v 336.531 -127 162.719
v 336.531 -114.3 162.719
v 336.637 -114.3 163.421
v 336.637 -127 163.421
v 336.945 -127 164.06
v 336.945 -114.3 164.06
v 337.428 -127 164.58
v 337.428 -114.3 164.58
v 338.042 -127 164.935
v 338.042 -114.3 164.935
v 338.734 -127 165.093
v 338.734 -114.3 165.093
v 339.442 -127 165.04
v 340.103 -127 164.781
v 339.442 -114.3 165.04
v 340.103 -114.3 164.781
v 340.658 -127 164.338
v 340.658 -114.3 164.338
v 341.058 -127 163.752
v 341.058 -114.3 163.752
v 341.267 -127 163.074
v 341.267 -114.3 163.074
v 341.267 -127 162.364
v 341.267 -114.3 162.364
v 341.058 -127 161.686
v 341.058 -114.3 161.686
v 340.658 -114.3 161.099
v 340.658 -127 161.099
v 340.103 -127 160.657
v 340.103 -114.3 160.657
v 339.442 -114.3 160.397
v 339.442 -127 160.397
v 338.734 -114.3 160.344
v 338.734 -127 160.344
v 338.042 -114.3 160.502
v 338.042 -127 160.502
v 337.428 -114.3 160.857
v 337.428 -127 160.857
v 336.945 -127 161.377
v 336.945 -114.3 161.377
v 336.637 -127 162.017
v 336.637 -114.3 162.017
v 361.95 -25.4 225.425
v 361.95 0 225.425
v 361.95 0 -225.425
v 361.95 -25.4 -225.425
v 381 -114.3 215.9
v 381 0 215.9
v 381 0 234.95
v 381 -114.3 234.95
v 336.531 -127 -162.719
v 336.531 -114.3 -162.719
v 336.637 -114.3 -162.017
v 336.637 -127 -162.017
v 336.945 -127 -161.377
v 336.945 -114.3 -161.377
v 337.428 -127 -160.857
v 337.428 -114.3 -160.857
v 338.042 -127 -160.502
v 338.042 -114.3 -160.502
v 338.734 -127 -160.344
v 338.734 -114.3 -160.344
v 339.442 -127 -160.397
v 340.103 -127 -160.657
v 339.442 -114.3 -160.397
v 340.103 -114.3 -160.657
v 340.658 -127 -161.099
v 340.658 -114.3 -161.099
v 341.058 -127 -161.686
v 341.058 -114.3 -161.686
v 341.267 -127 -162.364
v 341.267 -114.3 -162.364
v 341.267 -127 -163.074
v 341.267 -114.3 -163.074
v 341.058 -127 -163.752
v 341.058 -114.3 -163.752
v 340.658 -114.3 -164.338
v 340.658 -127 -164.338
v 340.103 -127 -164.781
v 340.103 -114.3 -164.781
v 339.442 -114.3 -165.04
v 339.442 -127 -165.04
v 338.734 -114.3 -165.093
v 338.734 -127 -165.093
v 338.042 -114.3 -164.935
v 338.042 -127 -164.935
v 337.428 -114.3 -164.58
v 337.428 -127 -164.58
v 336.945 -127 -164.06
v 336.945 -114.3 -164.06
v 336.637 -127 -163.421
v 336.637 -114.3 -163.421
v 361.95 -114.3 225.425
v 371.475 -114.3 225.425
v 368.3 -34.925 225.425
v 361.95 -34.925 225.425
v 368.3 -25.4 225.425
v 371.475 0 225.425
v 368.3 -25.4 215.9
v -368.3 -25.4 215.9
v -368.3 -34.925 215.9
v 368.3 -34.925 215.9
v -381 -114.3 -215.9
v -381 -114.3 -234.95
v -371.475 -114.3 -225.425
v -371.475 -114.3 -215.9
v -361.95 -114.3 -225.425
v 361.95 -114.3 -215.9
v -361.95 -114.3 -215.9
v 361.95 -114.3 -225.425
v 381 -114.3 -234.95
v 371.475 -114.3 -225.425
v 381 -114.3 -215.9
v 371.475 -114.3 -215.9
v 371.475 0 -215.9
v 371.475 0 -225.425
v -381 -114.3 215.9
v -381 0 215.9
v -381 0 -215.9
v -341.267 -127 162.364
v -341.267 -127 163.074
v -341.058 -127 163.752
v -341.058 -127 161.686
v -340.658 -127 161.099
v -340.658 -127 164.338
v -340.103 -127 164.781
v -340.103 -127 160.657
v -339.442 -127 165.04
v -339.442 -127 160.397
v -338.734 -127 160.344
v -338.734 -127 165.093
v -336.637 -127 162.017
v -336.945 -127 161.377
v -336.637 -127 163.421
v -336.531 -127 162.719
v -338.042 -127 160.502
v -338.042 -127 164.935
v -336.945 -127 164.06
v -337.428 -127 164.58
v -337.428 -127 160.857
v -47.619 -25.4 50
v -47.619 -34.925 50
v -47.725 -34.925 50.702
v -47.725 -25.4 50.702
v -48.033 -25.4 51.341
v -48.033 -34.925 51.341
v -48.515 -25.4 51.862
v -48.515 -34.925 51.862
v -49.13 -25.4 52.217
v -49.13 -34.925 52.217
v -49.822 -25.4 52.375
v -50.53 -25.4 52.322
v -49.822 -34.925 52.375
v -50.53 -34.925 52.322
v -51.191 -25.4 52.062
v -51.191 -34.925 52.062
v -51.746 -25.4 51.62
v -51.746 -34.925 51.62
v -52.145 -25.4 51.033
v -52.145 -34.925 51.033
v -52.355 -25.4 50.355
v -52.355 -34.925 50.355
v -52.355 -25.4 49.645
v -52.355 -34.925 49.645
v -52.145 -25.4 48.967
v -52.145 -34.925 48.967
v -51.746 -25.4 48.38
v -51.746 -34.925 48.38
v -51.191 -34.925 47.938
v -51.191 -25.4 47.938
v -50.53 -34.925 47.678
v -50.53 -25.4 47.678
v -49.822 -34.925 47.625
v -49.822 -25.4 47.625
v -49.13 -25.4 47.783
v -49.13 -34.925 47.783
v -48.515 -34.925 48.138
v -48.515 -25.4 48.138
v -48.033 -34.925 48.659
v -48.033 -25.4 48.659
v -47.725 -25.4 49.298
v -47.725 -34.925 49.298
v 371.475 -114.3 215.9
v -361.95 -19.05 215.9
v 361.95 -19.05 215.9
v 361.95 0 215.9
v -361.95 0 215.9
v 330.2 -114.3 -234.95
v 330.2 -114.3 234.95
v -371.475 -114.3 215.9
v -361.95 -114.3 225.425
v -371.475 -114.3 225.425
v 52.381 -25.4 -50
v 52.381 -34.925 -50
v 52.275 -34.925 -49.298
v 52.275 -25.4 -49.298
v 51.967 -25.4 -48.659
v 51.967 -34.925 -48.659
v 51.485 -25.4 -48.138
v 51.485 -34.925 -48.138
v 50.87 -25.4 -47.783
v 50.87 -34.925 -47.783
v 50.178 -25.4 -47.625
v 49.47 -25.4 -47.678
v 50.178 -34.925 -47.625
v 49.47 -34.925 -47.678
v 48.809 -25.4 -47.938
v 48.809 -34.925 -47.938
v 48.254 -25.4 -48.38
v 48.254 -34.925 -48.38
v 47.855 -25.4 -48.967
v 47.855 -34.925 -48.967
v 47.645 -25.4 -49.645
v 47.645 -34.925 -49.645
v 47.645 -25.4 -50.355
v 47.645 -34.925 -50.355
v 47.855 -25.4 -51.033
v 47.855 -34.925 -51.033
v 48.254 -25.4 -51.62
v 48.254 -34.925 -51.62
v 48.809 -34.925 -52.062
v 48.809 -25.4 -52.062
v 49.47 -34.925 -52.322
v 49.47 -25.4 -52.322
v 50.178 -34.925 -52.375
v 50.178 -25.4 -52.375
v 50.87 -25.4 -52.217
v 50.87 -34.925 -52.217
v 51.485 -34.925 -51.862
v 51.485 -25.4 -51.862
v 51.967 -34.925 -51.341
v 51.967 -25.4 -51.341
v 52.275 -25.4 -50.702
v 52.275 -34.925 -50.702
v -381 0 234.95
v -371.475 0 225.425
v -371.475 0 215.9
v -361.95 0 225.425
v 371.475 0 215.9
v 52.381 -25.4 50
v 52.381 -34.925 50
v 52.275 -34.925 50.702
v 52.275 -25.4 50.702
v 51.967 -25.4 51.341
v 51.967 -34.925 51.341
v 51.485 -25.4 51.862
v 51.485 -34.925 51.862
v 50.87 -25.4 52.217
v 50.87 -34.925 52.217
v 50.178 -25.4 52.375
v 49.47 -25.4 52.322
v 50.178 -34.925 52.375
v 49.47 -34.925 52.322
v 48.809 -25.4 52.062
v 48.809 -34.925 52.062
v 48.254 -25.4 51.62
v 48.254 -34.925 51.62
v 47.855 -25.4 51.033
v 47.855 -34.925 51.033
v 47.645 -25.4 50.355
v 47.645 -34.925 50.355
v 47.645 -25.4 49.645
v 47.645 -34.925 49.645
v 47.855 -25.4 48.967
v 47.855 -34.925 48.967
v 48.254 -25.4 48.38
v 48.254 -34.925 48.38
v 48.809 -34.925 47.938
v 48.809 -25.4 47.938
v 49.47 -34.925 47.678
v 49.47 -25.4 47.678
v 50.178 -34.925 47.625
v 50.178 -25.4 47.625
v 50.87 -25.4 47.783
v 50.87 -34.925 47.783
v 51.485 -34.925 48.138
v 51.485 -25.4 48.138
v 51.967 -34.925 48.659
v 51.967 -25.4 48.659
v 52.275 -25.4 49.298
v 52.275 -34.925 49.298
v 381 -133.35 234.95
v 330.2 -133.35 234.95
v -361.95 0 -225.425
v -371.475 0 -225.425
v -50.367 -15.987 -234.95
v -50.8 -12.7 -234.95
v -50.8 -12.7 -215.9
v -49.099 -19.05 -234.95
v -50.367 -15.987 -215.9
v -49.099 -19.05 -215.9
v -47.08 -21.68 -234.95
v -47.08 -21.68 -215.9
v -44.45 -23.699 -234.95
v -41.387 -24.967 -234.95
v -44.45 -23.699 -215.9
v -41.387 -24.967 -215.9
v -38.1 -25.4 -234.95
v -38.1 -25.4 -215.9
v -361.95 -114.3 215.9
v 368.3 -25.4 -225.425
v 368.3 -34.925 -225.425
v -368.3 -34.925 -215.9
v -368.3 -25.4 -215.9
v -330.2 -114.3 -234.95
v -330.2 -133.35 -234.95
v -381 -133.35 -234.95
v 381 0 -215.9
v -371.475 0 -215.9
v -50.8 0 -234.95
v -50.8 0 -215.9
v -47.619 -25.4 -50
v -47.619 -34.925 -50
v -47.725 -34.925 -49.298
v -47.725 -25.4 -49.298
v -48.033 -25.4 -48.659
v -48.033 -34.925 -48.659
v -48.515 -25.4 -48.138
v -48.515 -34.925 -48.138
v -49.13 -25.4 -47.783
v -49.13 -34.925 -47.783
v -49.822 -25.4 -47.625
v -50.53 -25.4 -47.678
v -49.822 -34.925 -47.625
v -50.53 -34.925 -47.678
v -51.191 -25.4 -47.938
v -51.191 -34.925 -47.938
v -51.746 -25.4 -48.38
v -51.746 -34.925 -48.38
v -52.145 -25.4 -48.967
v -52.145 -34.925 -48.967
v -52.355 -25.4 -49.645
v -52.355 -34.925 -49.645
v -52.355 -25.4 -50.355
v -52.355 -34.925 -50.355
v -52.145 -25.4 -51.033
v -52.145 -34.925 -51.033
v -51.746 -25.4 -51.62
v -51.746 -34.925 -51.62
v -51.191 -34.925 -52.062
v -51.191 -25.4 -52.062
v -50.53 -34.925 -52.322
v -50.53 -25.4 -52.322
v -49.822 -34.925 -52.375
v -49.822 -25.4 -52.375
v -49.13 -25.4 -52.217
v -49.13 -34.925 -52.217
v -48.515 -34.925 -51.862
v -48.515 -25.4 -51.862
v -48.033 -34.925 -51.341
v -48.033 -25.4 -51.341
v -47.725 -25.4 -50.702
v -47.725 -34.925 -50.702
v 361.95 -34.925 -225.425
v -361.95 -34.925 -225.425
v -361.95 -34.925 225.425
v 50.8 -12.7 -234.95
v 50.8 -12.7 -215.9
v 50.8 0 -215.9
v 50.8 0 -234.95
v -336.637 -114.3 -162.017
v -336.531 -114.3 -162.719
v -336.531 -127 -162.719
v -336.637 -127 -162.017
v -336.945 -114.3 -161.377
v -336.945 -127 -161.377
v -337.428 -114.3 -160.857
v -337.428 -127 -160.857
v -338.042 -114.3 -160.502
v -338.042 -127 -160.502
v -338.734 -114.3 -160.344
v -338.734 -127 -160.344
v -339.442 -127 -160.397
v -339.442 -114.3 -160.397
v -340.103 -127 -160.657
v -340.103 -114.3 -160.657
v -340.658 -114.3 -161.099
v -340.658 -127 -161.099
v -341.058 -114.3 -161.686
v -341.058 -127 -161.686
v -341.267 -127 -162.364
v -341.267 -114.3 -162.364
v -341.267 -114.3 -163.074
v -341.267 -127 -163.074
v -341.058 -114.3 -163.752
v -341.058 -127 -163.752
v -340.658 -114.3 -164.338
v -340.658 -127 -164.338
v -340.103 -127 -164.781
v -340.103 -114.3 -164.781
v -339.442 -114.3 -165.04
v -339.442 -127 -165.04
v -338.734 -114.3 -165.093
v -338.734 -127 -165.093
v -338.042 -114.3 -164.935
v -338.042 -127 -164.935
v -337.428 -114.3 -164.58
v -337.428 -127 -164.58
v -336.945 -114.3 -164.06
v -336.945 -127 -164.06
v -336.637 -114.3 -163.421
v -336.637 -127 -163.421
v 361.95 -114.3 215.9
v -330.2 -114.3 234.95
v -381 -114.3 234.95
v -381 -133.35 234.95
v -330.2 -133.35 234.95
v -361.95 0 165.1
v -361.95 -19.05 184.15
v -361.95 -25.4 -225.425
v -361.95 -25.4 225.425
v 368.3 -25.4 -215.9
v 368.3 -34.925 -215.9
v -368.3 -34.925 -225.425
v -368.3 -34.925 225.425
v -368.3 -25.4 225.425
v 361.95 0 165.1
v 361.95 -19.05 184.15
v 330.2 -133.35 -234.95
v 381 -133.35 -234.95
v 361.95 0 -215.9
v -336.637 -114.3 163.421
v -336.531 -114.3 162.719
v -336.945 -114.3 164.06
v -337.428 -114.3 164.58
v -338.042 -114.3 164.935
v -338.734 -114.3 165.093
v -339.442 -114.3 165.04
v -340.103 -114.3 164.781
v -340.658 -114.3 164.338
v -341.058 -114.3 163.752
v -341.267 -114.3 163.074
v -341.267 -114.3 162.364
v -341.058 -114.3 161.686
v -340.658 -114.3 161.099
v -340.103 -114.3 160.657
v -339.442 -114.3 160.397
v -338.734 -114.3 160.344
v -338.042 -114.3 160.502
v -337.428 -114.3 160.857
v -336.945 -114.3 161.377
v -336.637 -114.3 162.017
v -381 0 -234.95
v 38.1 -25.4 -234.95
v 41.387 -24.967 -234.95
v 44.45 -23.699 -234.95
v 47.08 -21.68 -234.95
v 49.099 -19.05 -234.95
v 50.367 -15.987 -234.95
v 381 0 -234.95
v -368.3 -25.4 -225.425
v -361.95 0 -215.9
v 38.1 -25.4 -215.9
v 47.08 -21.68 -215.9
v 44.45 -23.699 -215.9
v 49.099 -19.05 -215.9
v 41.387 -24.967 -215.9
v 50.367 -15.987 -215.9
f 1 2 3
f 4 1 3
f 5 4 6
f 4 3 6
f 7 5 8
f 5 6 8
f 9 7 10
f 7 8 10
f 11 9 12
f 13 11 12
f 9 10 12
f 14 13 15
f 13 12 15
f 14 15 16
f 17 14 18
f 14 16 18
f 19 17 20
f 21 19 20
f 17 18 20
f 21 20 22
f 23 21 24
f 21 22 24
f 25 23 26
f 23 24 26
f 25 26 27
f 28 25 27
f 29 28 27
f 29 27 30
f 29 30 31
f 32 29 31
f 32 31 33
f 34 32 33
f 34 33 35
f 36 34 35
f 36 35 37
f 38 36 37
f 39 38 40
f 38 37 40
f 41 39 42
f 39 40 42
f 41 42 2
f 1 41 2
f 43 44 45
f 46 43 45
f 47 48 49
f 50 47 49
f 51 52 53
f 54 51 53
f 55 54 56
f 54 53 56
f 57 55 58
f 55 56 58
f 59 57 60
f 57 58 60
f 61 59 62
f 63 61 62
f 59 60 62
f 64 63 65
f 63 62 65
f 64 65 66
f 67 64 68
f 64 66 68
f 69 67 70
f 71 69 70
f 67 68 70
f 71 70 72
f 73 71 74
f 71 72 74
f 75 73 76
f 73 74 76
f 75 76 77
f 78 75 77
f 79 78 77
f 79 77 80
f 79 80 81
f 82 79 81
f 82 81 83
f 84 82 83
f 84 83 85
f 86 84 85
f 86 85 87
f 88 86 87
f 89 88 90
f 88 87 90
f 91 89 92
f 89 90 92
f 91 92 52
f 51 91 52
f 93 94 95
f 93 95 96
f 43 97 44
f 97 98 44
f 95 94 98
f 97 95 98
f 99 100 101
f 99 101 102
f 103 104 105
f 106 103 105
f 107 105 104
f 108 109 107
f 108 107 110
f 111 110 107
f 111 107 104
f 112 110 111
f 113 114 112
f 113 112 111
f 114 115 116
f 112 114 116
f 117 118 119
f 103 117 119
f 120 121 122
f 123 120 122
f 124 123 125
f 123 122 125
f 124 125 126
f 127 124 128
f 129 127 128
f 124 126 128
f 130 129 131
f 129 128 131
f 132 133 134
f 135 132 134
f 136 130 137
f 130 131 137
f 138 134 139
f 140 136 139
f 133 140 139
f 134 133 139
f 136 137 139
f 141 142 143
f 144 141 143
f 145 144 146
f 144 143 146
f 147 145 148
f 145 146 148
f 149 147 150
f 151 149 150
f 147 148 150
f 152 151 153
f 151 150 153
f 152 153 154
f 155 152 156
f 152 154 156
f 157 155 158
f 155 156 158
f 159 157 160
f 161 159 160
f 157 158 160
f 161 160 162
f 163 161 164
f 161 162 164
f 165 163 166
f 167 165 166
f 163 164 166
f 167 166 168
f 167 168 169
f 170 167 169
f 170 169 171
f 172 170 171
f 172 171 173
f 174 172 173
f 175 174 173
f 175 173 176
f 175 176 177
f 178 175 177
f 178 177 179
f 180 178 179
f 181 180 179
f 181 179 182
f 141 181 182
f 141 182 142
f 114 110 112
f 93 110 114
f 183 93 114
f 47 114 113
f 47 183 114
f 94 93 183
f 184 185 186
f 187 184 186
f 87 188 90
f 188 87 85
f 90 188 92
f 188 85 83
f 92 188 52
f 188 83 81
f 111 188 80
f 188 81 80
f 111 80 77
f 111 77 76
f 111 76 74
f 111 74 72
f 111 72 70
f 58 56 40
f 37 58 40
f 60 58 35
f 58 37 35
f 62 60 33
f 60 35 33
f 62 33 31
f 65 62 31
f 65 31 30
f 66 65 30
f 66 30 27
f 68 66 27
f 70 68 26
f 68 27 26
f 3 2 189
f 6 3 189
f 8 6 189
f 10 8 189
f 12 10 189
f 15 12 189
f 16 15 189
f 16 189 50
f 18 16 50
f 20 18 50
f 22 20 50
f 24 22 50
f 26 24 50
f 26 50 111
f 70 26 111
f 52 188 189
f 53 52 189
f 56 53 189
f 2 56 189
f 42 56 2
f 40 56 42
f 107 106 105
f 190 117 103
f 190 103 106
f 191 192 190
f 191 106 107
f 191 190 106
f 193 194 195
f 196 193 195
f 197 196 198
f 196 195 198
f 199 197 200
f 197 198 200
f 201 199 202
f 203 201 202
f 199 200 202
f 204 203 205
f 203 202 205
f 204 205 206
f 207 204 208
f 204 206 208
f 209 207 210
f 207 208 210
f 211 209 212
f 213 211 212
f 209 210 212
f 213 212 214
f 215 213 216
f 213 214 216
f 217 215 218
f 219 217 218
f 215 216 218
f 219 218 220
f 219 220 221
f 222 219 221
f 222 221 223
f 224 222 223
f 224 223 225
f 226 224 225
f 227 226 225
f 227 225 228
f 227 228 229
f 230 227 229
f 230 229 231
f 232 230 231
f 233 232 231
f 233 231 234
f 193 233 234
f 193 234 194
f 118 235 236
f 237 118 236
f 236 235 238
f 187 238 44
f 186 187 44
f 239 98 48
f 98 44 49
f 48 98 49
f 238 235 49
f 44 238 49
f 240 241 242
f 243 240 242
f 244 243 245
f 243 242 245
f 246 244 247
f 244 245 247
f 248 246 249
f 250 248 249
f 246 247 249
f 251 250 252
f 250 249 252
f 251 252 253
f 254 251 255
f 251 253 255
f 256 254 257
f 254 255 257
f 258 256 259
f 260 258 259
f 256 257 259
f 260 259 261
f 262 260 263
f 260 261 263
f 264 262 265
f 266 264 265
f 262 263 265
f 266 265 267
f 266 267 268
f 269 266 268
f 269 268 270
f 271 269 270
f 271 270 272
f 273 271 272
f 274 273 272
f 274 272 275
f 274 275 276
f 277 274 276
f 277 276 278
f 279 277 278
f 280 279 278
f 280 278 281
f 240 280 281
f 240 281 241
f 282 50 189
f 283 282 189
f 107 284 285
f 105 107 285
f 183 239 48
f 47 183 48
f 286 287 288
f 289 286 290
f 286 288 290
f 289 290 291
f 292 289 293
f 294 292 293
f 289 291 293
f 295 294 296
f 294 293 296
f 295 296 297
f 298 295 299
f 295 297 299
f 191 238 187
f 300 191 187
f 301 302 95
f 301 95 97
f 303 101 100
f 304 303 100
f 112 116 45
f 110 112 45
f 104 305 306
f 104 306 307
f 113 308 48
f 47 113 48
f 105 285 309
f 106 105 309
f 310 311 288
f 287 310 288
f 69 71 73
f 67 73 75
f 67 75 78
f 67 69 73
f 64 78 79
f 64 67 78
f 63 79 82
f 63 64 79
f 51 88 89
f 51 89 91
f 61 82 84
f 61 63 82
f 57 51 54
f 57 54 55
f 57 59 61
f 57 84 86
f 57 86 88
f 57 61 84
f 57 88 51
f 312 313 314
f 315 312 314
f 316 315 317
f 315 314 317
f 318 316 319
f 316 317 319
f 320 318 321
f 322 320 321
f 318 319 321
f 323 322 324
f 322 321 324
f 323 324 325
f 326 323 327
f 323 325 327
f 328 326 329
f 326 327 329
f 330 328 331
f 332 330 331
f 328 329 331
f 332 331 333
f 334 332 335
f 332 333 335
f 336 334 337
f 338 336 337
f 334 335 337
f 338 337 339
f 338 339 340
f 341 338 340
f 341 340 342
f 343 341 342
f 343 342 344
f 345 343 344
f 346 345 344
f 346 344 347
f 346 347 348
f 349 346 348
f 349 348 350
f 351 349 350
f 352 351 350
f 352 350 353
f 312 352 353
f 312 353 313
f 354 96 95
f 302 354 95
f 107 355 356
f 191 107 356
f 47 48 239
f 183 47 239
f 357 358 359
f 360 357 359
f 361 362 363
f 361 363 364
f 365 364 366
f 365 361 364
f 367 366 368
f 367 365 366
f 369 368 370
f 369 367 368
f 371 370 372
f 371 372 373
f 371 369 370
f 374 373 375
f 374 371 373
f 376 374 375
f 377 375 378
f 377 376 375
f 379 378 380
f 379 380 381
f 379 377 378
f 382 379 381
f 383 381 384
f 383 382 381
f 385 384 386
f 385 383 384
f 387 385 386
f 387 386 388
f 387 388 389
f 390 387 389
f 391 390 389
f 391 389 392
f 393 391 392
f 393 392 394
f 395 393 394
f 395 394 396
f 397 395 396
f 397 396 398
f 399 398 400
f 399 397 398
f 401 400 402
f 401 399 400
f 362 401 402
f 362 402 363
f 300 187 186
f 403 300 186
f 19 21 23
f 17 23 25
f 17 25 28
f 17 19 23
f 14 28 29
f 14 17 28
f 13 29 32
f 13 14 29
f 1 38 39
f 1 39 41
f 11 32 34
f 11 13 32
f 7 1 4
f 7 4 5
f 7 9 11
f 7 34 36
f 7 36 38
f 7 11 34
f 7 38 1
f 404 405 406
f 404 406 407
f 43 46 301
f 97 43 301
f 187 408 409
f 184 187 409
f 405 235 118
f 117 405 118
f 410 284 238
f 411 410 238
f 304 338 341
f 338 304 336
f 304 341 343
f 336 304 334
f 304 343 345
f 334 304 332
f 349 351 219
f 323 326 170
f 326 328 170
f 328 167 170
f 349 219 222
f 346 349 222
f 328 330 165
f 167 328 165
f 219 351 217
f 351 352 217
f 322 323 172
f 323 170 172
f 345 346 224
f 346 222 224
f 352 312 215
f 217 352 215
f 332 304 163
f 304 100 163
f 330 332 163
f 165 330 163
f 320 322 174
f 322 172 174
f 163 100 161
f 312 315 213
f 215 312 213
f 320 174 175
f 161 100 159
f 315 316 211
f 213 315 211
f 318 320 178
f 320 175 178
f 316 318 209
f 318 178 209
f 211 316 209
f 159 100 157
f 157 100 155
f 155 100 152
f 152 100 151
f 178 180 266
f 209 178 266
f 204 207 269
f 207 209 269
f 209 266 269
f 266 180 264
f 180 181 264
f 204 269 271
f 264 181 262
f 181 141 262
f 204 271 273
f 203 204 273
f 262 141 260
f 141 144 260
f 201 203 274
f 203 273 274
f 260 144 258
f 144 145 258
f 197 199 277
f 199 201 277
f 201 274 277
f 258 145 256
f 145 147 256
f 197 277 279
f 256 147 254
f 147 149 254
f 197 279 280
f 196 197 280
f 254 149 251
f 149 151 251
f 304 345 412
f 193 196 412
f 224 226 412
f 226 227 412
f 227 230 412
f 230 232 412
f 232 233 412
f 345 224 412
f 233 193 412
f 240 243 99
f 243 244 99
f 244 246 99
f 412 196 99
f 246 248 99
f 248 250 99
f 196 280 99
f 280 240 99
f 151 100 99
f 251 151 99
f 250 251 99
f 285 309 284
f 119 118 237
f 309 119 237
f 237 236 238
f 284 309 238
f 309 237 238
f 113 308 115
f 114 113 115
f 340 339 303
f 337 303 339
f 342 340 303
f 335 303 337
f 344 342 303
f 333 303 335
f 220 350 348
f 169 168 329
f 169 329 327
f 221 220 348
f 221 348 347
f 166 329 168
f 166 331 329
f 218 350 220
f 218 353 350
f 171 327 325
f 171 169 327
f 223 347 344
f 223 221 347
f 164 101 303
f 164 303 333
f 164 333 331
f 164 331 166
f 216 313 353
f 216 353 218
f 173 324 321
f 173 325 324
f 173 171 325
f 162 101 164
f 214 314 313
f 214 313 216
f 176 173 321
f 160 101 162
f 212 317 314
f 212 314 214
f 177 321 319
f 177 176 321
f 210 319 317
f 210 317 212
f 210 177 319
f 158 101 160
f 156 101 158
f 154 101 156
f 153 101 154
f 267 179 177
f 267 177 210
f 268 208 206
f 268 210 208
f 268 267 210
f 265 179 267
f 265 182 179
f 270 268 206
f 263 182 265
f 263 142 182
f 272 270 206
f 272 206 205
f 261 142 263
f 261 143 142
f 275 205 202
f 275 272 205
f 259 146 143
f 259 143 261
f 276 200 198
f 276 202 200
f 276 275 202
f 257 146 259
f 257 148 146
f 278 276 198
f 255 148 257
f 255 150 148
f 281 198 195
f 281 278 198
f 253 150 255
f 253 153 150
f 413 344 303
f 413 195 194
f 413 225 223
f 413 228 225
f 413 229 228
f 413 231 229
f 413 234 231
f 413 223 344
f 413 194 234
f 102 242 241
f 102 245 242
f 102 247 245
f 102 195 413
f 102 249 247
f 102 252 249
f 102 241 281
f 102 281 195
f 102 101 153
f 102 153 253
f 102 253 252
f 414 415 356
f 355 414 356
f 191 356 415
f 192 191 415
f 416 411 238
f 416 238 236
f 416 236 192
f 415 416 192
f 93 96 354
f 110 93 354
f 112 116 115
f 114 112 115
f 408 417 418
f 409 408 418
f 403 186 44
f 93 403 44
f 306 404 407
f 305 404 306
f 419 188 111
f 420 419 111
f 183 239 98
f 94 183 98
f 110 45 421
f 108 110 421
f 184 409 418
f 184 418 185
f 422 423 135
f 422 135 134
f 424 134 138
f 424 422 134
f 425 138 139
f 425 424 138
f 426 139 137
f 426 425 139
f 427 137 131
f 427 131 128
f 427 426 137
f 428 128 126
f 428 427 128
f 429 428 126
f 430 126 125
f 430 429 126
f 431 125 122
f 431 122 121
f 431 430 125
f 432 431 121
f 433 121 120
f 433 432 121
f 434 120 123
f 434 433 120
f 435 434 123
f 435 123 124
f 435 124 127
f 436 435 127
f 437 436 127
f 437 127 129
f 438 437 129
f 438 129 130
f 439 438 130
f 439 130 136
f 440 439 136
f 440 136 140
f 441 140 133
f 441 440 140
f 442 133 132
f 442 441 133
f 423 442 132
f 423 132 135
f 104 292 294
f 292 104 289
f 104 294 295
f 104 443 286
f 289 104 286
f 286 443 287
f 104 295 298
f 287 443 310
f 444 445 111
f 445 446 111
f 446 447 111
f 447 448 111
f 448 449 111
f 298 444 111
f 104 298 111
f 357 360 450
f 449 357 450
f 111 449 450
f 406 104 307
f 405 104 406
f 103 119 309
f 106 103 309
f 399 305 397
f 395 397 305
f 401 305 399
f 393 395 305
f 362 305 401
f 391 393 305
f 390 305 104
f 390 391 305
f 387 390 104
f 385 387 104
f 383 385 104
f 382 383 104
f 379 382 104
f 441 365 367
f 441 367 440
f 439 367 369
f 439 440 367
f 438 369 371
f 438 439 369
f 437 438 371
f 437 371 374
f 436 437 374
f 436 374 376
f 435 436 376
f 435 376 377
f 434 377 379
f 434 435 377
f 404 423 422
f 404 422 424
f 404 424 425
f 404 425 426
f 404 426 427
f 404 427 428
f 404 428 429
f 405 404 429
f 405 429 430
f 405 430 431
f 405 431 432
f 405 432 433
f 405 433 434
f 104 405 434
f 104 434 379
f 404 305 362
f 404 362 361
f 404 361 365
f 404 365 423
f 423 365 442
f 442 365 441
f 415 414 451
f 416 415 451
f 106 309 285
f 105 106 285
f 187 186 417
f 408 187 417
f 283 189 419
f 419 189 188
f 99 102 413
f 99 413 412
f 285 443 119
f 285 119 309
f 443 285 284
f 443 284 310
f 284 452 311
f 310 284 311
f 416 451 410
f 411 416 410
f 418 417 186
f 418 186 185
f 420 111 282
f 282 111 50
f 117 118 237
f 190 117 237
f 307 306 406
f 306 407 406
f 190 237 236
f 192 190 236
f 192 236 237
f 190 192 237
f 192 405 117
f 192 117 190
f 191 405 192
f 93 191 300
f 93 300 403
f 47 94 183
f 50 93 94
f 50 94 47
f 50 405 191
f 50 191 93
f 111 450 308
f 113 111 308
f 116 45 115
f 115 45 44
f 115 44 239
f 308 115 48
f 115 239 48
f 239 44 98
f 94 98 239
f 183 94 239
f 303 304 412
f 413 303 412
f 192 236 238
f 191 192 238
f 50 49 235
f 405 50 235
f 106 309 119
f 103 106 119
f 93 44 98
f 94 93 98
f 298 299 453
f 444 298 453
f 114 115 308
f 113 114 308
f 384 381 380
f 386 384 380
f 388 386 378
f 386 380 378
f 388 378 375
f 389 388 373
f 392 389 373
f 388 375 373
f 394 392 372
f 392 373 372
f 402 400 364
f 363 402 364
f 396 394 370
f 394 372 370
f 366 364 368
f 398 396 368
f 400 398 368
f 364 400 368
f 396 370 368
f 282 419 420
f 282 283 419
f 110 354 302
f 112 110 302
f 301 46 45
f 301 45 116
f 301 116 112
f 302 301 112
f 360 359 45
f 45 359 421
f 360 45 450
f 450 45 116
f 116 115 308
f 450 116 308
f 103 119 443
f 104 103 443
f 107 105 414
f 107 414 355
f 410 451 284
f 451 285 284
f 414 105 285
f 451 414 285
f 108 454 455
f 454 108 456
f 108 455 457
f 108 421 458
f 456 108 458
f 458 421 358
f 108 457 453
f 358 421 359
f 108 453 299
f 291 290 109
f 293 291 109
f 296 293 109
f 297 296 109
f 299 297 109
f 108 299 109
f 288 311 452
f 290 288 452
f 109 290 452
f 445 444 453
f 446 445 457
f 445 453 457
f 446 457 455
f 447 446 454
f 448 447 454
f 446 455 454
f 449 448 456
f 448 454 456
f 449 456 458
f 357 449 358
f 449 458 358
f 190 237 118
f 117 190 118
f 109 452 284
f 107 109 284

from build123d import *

# Parameters (mm, degrees)
F4_DEPTH       = 114.3
F5_W           = 6.35
F5_H           = 9.525
F6_DEPTH       = 234.951
F6_DEPTH_BACK  = 234.951
F8_DEPTH       = 19.05
F10_DEPTH      = 25.4
F12_DEPTH      = 723.9
F13_R          = 2.38125
F14_DEPTH      = 12.7
F15_W          = 736.6
F15_H          = 9.525
F16_DEPTH      = 215.9
F16_DEPTH_BACK = 215.9
F18_R          = 2.38125
F19_DEPTH      = 34.926


with BuildPart() as f4:
    # F1 (on Front) → F4 (new body)
    with BuildSketch(Plane.XZ):
        Polygon((381, 234.95), (-381, 234.95), (-381, 215.9), (-371.475, 215.9), (-371.475, 225.425), (-361.95, 225.425), (-361.95, 215.9), (361.95, 215.9), (361.95, 225.425), (371.475, 225.425), (371.475, 215.9), (381, 215.9), align=None)
    extrude(amount=F4_DEPTH)


with BuildPart() as f4b:
    # F3 (on Front) → F4, piece 2 (new body)
    with BuildSketch(Plane.XZ):
        Polygon((-371.475, 215.9), (-381, 215.9), (-381, -215.9), (-371.475, -215.9), (-371.475, -225.425), (-361.95, -225.425), (-361.95, -215.9), (-361.95, 215.9), (-361.95, 225.425), (-371.475, 225.425), align=None)
    extrude(amount=F4_DEPTH)


with BuildPart() as f4c:
    # F3 (on Front) → F4, piece 3 (new body)
    with BuildSketch(Plane.XZ):
        Polygon((381, 215.9), (371.475, 215.9), (371.475, 225.425), (361.95, 225.425), (361.95, 215.9), (361.95, -215.9), (361.95, -225.425), (371.475, -225.425), (371.475, -215.9), (381, -215.9), align=None)
    extrude(amount=F4_DEPTH)


with BuildPart() as f4d:
    # F2 (on Front) → F4, piece 4 (new body)
    with BuildSketch(Plane.XZ):
        Polygon((-381, -215.9), (-381, -234.95), (381, -234.95), (381, -215.9), (371.475, -215.9), (371.475, -225.425), (361.95, -225.425), (361.95, -215.9), (-361.95, -215.9), (-361.95, -225.425), (-371.475, -225.425), (-371.475, -215.9), align=None)
    extrude(amount=F4_DEPTH)

    # F9 (on face) → F10 (cut)
    with BuildSketch(Plane.XY.offset(-215.9)):
        with BuildLine():
            Line((50.8, 0), (-50.8, 0))
            Line((-50.8, 0), (-50.8, -12.7))
            ThreePointArc((-50.8, -12.7), (-47.0802561211, -21.6802561211), (-38.1, -25.4))
            Line((-38.1, -25.4), (38.1, -25.4))
            ThreePointArc((38.1, -25.4), (47.0802561211, -21.6802561211), (50.8, -12.7))
            Line((50.8, -12.7), (50.8, 0))
        make_face()
    extrude(amount=-F10_DEPTH, mode=Mode.SUBTRACT)


with BuildPart() as f6_tool:
    # F5 (on Top) → F6 (new body, two sides)
    with BuildSketch(Plane.XY) as f6_sk:
        with Locations((-365.125, -30.1625)):
            Rectangle(F5_W, F5_H)
        with Locations((365.125, -30.1625)):
            Rectangle(F5_W, F5_H)
    extrude(amount=-F6_DEPTH)
    extrude(f6_sk.sketch, amount=F6_DEPTH_BACK)


with BuildPart() as f4b_1:
    add(f4b.part)

    # F6: cut by f6_tool
    add(f6_tool.part, mode=Mode.SUBTRACT)


with BuildPart() as f4c_1:
    add(f4c.part)

    # F6: cut by f6_tool
    add(f6_tool.part, mode=Mode.SUBTRACT)


with BuildPart() as f8:
    # F7 (on face) → F8 (new body)
    with BuildSketch(Plane.XZ.offset(114.3)):
        Polygon((361.95, 215.9), (330.2, 215.9), (330.2, -234.95), (381, -234.95), (381, 215.9), (371.475, 215.9), (371.475, 225.425), (361.95, 225.425), align=None)
        Polygon((381, 234.95), (330.2, 234.95), (330.2, 215.9), (361.95, 215.9), (361.95, 225.425), (371.475, 225.425), (371.475, 215.9), (381, 215.9), align=None)
    extrude(amount=F8_DEPTH)

    # F13 (on face) → F14 (cut)
    with BuildSketch(Plane(origin=(0, -114.3, 0), x_dir=(-1, 0, 0), z_dir=(0, 1, 0))):
        with Locations((-338.9122, 162.71875)):
            Circle(F13_R)
        with Locations((-338.9122, -162.71875)):
            Circle(F13_R)
    extrude(amount=-F14_DEPTH, mode=Mode.SUBTRACT)


with BuildPart() as f12:
    # F11 (on face) → F12 (new body, through all)
    with BuildSketch(Plane(origin=(361.95, 0, 0), x_dir=(0, -1, 0), z_dir=(-1, 0, 0))):
        Polygon((19.05, 215.9), (0, 215.9), (0, 165.1), (19.05, 184.15), align=None)
    extrude(amount=F12_DEPTH)


with BuildPart() as f16:
    # F15 (on Top) → F16 (new body, two sides)
    with BuildSketch(Plane.XY) as f16_sk:
        with Locations((0, -30.1625)):
            Rectangle(F15_W, F15_H)
    extrude(amount=F16_DEPTH)
    extrude(f16_sk.sketch, amount=-F16_DEPTH_BACK)

    # F18 (on face) → F19 (cut, through all)
    with BuildSketch(Plane.XZ.offset(34.925)):
        with Locations((-50, 50)):
            Circle(F18_R)
        with Locations((50, 50)):
            Circle(F18_R)
        with Locations((-50, -50)):
            Circle(F18_R)
        with Locations((50, -50)):
            Circle(F18_R)
    extrude(amount=-F19_DEPTH, mode=Mode.SUBTRACT)


with BuildPart() as f17_1:
    # F17: instance of F8
    add(f8.part.mirror(Plane.YZ))


solid = Compound([f4.part, f4d.part, f4b_1.part, f4c_1.part, f8.part, f12.part, f16.part, f17_1.part])
